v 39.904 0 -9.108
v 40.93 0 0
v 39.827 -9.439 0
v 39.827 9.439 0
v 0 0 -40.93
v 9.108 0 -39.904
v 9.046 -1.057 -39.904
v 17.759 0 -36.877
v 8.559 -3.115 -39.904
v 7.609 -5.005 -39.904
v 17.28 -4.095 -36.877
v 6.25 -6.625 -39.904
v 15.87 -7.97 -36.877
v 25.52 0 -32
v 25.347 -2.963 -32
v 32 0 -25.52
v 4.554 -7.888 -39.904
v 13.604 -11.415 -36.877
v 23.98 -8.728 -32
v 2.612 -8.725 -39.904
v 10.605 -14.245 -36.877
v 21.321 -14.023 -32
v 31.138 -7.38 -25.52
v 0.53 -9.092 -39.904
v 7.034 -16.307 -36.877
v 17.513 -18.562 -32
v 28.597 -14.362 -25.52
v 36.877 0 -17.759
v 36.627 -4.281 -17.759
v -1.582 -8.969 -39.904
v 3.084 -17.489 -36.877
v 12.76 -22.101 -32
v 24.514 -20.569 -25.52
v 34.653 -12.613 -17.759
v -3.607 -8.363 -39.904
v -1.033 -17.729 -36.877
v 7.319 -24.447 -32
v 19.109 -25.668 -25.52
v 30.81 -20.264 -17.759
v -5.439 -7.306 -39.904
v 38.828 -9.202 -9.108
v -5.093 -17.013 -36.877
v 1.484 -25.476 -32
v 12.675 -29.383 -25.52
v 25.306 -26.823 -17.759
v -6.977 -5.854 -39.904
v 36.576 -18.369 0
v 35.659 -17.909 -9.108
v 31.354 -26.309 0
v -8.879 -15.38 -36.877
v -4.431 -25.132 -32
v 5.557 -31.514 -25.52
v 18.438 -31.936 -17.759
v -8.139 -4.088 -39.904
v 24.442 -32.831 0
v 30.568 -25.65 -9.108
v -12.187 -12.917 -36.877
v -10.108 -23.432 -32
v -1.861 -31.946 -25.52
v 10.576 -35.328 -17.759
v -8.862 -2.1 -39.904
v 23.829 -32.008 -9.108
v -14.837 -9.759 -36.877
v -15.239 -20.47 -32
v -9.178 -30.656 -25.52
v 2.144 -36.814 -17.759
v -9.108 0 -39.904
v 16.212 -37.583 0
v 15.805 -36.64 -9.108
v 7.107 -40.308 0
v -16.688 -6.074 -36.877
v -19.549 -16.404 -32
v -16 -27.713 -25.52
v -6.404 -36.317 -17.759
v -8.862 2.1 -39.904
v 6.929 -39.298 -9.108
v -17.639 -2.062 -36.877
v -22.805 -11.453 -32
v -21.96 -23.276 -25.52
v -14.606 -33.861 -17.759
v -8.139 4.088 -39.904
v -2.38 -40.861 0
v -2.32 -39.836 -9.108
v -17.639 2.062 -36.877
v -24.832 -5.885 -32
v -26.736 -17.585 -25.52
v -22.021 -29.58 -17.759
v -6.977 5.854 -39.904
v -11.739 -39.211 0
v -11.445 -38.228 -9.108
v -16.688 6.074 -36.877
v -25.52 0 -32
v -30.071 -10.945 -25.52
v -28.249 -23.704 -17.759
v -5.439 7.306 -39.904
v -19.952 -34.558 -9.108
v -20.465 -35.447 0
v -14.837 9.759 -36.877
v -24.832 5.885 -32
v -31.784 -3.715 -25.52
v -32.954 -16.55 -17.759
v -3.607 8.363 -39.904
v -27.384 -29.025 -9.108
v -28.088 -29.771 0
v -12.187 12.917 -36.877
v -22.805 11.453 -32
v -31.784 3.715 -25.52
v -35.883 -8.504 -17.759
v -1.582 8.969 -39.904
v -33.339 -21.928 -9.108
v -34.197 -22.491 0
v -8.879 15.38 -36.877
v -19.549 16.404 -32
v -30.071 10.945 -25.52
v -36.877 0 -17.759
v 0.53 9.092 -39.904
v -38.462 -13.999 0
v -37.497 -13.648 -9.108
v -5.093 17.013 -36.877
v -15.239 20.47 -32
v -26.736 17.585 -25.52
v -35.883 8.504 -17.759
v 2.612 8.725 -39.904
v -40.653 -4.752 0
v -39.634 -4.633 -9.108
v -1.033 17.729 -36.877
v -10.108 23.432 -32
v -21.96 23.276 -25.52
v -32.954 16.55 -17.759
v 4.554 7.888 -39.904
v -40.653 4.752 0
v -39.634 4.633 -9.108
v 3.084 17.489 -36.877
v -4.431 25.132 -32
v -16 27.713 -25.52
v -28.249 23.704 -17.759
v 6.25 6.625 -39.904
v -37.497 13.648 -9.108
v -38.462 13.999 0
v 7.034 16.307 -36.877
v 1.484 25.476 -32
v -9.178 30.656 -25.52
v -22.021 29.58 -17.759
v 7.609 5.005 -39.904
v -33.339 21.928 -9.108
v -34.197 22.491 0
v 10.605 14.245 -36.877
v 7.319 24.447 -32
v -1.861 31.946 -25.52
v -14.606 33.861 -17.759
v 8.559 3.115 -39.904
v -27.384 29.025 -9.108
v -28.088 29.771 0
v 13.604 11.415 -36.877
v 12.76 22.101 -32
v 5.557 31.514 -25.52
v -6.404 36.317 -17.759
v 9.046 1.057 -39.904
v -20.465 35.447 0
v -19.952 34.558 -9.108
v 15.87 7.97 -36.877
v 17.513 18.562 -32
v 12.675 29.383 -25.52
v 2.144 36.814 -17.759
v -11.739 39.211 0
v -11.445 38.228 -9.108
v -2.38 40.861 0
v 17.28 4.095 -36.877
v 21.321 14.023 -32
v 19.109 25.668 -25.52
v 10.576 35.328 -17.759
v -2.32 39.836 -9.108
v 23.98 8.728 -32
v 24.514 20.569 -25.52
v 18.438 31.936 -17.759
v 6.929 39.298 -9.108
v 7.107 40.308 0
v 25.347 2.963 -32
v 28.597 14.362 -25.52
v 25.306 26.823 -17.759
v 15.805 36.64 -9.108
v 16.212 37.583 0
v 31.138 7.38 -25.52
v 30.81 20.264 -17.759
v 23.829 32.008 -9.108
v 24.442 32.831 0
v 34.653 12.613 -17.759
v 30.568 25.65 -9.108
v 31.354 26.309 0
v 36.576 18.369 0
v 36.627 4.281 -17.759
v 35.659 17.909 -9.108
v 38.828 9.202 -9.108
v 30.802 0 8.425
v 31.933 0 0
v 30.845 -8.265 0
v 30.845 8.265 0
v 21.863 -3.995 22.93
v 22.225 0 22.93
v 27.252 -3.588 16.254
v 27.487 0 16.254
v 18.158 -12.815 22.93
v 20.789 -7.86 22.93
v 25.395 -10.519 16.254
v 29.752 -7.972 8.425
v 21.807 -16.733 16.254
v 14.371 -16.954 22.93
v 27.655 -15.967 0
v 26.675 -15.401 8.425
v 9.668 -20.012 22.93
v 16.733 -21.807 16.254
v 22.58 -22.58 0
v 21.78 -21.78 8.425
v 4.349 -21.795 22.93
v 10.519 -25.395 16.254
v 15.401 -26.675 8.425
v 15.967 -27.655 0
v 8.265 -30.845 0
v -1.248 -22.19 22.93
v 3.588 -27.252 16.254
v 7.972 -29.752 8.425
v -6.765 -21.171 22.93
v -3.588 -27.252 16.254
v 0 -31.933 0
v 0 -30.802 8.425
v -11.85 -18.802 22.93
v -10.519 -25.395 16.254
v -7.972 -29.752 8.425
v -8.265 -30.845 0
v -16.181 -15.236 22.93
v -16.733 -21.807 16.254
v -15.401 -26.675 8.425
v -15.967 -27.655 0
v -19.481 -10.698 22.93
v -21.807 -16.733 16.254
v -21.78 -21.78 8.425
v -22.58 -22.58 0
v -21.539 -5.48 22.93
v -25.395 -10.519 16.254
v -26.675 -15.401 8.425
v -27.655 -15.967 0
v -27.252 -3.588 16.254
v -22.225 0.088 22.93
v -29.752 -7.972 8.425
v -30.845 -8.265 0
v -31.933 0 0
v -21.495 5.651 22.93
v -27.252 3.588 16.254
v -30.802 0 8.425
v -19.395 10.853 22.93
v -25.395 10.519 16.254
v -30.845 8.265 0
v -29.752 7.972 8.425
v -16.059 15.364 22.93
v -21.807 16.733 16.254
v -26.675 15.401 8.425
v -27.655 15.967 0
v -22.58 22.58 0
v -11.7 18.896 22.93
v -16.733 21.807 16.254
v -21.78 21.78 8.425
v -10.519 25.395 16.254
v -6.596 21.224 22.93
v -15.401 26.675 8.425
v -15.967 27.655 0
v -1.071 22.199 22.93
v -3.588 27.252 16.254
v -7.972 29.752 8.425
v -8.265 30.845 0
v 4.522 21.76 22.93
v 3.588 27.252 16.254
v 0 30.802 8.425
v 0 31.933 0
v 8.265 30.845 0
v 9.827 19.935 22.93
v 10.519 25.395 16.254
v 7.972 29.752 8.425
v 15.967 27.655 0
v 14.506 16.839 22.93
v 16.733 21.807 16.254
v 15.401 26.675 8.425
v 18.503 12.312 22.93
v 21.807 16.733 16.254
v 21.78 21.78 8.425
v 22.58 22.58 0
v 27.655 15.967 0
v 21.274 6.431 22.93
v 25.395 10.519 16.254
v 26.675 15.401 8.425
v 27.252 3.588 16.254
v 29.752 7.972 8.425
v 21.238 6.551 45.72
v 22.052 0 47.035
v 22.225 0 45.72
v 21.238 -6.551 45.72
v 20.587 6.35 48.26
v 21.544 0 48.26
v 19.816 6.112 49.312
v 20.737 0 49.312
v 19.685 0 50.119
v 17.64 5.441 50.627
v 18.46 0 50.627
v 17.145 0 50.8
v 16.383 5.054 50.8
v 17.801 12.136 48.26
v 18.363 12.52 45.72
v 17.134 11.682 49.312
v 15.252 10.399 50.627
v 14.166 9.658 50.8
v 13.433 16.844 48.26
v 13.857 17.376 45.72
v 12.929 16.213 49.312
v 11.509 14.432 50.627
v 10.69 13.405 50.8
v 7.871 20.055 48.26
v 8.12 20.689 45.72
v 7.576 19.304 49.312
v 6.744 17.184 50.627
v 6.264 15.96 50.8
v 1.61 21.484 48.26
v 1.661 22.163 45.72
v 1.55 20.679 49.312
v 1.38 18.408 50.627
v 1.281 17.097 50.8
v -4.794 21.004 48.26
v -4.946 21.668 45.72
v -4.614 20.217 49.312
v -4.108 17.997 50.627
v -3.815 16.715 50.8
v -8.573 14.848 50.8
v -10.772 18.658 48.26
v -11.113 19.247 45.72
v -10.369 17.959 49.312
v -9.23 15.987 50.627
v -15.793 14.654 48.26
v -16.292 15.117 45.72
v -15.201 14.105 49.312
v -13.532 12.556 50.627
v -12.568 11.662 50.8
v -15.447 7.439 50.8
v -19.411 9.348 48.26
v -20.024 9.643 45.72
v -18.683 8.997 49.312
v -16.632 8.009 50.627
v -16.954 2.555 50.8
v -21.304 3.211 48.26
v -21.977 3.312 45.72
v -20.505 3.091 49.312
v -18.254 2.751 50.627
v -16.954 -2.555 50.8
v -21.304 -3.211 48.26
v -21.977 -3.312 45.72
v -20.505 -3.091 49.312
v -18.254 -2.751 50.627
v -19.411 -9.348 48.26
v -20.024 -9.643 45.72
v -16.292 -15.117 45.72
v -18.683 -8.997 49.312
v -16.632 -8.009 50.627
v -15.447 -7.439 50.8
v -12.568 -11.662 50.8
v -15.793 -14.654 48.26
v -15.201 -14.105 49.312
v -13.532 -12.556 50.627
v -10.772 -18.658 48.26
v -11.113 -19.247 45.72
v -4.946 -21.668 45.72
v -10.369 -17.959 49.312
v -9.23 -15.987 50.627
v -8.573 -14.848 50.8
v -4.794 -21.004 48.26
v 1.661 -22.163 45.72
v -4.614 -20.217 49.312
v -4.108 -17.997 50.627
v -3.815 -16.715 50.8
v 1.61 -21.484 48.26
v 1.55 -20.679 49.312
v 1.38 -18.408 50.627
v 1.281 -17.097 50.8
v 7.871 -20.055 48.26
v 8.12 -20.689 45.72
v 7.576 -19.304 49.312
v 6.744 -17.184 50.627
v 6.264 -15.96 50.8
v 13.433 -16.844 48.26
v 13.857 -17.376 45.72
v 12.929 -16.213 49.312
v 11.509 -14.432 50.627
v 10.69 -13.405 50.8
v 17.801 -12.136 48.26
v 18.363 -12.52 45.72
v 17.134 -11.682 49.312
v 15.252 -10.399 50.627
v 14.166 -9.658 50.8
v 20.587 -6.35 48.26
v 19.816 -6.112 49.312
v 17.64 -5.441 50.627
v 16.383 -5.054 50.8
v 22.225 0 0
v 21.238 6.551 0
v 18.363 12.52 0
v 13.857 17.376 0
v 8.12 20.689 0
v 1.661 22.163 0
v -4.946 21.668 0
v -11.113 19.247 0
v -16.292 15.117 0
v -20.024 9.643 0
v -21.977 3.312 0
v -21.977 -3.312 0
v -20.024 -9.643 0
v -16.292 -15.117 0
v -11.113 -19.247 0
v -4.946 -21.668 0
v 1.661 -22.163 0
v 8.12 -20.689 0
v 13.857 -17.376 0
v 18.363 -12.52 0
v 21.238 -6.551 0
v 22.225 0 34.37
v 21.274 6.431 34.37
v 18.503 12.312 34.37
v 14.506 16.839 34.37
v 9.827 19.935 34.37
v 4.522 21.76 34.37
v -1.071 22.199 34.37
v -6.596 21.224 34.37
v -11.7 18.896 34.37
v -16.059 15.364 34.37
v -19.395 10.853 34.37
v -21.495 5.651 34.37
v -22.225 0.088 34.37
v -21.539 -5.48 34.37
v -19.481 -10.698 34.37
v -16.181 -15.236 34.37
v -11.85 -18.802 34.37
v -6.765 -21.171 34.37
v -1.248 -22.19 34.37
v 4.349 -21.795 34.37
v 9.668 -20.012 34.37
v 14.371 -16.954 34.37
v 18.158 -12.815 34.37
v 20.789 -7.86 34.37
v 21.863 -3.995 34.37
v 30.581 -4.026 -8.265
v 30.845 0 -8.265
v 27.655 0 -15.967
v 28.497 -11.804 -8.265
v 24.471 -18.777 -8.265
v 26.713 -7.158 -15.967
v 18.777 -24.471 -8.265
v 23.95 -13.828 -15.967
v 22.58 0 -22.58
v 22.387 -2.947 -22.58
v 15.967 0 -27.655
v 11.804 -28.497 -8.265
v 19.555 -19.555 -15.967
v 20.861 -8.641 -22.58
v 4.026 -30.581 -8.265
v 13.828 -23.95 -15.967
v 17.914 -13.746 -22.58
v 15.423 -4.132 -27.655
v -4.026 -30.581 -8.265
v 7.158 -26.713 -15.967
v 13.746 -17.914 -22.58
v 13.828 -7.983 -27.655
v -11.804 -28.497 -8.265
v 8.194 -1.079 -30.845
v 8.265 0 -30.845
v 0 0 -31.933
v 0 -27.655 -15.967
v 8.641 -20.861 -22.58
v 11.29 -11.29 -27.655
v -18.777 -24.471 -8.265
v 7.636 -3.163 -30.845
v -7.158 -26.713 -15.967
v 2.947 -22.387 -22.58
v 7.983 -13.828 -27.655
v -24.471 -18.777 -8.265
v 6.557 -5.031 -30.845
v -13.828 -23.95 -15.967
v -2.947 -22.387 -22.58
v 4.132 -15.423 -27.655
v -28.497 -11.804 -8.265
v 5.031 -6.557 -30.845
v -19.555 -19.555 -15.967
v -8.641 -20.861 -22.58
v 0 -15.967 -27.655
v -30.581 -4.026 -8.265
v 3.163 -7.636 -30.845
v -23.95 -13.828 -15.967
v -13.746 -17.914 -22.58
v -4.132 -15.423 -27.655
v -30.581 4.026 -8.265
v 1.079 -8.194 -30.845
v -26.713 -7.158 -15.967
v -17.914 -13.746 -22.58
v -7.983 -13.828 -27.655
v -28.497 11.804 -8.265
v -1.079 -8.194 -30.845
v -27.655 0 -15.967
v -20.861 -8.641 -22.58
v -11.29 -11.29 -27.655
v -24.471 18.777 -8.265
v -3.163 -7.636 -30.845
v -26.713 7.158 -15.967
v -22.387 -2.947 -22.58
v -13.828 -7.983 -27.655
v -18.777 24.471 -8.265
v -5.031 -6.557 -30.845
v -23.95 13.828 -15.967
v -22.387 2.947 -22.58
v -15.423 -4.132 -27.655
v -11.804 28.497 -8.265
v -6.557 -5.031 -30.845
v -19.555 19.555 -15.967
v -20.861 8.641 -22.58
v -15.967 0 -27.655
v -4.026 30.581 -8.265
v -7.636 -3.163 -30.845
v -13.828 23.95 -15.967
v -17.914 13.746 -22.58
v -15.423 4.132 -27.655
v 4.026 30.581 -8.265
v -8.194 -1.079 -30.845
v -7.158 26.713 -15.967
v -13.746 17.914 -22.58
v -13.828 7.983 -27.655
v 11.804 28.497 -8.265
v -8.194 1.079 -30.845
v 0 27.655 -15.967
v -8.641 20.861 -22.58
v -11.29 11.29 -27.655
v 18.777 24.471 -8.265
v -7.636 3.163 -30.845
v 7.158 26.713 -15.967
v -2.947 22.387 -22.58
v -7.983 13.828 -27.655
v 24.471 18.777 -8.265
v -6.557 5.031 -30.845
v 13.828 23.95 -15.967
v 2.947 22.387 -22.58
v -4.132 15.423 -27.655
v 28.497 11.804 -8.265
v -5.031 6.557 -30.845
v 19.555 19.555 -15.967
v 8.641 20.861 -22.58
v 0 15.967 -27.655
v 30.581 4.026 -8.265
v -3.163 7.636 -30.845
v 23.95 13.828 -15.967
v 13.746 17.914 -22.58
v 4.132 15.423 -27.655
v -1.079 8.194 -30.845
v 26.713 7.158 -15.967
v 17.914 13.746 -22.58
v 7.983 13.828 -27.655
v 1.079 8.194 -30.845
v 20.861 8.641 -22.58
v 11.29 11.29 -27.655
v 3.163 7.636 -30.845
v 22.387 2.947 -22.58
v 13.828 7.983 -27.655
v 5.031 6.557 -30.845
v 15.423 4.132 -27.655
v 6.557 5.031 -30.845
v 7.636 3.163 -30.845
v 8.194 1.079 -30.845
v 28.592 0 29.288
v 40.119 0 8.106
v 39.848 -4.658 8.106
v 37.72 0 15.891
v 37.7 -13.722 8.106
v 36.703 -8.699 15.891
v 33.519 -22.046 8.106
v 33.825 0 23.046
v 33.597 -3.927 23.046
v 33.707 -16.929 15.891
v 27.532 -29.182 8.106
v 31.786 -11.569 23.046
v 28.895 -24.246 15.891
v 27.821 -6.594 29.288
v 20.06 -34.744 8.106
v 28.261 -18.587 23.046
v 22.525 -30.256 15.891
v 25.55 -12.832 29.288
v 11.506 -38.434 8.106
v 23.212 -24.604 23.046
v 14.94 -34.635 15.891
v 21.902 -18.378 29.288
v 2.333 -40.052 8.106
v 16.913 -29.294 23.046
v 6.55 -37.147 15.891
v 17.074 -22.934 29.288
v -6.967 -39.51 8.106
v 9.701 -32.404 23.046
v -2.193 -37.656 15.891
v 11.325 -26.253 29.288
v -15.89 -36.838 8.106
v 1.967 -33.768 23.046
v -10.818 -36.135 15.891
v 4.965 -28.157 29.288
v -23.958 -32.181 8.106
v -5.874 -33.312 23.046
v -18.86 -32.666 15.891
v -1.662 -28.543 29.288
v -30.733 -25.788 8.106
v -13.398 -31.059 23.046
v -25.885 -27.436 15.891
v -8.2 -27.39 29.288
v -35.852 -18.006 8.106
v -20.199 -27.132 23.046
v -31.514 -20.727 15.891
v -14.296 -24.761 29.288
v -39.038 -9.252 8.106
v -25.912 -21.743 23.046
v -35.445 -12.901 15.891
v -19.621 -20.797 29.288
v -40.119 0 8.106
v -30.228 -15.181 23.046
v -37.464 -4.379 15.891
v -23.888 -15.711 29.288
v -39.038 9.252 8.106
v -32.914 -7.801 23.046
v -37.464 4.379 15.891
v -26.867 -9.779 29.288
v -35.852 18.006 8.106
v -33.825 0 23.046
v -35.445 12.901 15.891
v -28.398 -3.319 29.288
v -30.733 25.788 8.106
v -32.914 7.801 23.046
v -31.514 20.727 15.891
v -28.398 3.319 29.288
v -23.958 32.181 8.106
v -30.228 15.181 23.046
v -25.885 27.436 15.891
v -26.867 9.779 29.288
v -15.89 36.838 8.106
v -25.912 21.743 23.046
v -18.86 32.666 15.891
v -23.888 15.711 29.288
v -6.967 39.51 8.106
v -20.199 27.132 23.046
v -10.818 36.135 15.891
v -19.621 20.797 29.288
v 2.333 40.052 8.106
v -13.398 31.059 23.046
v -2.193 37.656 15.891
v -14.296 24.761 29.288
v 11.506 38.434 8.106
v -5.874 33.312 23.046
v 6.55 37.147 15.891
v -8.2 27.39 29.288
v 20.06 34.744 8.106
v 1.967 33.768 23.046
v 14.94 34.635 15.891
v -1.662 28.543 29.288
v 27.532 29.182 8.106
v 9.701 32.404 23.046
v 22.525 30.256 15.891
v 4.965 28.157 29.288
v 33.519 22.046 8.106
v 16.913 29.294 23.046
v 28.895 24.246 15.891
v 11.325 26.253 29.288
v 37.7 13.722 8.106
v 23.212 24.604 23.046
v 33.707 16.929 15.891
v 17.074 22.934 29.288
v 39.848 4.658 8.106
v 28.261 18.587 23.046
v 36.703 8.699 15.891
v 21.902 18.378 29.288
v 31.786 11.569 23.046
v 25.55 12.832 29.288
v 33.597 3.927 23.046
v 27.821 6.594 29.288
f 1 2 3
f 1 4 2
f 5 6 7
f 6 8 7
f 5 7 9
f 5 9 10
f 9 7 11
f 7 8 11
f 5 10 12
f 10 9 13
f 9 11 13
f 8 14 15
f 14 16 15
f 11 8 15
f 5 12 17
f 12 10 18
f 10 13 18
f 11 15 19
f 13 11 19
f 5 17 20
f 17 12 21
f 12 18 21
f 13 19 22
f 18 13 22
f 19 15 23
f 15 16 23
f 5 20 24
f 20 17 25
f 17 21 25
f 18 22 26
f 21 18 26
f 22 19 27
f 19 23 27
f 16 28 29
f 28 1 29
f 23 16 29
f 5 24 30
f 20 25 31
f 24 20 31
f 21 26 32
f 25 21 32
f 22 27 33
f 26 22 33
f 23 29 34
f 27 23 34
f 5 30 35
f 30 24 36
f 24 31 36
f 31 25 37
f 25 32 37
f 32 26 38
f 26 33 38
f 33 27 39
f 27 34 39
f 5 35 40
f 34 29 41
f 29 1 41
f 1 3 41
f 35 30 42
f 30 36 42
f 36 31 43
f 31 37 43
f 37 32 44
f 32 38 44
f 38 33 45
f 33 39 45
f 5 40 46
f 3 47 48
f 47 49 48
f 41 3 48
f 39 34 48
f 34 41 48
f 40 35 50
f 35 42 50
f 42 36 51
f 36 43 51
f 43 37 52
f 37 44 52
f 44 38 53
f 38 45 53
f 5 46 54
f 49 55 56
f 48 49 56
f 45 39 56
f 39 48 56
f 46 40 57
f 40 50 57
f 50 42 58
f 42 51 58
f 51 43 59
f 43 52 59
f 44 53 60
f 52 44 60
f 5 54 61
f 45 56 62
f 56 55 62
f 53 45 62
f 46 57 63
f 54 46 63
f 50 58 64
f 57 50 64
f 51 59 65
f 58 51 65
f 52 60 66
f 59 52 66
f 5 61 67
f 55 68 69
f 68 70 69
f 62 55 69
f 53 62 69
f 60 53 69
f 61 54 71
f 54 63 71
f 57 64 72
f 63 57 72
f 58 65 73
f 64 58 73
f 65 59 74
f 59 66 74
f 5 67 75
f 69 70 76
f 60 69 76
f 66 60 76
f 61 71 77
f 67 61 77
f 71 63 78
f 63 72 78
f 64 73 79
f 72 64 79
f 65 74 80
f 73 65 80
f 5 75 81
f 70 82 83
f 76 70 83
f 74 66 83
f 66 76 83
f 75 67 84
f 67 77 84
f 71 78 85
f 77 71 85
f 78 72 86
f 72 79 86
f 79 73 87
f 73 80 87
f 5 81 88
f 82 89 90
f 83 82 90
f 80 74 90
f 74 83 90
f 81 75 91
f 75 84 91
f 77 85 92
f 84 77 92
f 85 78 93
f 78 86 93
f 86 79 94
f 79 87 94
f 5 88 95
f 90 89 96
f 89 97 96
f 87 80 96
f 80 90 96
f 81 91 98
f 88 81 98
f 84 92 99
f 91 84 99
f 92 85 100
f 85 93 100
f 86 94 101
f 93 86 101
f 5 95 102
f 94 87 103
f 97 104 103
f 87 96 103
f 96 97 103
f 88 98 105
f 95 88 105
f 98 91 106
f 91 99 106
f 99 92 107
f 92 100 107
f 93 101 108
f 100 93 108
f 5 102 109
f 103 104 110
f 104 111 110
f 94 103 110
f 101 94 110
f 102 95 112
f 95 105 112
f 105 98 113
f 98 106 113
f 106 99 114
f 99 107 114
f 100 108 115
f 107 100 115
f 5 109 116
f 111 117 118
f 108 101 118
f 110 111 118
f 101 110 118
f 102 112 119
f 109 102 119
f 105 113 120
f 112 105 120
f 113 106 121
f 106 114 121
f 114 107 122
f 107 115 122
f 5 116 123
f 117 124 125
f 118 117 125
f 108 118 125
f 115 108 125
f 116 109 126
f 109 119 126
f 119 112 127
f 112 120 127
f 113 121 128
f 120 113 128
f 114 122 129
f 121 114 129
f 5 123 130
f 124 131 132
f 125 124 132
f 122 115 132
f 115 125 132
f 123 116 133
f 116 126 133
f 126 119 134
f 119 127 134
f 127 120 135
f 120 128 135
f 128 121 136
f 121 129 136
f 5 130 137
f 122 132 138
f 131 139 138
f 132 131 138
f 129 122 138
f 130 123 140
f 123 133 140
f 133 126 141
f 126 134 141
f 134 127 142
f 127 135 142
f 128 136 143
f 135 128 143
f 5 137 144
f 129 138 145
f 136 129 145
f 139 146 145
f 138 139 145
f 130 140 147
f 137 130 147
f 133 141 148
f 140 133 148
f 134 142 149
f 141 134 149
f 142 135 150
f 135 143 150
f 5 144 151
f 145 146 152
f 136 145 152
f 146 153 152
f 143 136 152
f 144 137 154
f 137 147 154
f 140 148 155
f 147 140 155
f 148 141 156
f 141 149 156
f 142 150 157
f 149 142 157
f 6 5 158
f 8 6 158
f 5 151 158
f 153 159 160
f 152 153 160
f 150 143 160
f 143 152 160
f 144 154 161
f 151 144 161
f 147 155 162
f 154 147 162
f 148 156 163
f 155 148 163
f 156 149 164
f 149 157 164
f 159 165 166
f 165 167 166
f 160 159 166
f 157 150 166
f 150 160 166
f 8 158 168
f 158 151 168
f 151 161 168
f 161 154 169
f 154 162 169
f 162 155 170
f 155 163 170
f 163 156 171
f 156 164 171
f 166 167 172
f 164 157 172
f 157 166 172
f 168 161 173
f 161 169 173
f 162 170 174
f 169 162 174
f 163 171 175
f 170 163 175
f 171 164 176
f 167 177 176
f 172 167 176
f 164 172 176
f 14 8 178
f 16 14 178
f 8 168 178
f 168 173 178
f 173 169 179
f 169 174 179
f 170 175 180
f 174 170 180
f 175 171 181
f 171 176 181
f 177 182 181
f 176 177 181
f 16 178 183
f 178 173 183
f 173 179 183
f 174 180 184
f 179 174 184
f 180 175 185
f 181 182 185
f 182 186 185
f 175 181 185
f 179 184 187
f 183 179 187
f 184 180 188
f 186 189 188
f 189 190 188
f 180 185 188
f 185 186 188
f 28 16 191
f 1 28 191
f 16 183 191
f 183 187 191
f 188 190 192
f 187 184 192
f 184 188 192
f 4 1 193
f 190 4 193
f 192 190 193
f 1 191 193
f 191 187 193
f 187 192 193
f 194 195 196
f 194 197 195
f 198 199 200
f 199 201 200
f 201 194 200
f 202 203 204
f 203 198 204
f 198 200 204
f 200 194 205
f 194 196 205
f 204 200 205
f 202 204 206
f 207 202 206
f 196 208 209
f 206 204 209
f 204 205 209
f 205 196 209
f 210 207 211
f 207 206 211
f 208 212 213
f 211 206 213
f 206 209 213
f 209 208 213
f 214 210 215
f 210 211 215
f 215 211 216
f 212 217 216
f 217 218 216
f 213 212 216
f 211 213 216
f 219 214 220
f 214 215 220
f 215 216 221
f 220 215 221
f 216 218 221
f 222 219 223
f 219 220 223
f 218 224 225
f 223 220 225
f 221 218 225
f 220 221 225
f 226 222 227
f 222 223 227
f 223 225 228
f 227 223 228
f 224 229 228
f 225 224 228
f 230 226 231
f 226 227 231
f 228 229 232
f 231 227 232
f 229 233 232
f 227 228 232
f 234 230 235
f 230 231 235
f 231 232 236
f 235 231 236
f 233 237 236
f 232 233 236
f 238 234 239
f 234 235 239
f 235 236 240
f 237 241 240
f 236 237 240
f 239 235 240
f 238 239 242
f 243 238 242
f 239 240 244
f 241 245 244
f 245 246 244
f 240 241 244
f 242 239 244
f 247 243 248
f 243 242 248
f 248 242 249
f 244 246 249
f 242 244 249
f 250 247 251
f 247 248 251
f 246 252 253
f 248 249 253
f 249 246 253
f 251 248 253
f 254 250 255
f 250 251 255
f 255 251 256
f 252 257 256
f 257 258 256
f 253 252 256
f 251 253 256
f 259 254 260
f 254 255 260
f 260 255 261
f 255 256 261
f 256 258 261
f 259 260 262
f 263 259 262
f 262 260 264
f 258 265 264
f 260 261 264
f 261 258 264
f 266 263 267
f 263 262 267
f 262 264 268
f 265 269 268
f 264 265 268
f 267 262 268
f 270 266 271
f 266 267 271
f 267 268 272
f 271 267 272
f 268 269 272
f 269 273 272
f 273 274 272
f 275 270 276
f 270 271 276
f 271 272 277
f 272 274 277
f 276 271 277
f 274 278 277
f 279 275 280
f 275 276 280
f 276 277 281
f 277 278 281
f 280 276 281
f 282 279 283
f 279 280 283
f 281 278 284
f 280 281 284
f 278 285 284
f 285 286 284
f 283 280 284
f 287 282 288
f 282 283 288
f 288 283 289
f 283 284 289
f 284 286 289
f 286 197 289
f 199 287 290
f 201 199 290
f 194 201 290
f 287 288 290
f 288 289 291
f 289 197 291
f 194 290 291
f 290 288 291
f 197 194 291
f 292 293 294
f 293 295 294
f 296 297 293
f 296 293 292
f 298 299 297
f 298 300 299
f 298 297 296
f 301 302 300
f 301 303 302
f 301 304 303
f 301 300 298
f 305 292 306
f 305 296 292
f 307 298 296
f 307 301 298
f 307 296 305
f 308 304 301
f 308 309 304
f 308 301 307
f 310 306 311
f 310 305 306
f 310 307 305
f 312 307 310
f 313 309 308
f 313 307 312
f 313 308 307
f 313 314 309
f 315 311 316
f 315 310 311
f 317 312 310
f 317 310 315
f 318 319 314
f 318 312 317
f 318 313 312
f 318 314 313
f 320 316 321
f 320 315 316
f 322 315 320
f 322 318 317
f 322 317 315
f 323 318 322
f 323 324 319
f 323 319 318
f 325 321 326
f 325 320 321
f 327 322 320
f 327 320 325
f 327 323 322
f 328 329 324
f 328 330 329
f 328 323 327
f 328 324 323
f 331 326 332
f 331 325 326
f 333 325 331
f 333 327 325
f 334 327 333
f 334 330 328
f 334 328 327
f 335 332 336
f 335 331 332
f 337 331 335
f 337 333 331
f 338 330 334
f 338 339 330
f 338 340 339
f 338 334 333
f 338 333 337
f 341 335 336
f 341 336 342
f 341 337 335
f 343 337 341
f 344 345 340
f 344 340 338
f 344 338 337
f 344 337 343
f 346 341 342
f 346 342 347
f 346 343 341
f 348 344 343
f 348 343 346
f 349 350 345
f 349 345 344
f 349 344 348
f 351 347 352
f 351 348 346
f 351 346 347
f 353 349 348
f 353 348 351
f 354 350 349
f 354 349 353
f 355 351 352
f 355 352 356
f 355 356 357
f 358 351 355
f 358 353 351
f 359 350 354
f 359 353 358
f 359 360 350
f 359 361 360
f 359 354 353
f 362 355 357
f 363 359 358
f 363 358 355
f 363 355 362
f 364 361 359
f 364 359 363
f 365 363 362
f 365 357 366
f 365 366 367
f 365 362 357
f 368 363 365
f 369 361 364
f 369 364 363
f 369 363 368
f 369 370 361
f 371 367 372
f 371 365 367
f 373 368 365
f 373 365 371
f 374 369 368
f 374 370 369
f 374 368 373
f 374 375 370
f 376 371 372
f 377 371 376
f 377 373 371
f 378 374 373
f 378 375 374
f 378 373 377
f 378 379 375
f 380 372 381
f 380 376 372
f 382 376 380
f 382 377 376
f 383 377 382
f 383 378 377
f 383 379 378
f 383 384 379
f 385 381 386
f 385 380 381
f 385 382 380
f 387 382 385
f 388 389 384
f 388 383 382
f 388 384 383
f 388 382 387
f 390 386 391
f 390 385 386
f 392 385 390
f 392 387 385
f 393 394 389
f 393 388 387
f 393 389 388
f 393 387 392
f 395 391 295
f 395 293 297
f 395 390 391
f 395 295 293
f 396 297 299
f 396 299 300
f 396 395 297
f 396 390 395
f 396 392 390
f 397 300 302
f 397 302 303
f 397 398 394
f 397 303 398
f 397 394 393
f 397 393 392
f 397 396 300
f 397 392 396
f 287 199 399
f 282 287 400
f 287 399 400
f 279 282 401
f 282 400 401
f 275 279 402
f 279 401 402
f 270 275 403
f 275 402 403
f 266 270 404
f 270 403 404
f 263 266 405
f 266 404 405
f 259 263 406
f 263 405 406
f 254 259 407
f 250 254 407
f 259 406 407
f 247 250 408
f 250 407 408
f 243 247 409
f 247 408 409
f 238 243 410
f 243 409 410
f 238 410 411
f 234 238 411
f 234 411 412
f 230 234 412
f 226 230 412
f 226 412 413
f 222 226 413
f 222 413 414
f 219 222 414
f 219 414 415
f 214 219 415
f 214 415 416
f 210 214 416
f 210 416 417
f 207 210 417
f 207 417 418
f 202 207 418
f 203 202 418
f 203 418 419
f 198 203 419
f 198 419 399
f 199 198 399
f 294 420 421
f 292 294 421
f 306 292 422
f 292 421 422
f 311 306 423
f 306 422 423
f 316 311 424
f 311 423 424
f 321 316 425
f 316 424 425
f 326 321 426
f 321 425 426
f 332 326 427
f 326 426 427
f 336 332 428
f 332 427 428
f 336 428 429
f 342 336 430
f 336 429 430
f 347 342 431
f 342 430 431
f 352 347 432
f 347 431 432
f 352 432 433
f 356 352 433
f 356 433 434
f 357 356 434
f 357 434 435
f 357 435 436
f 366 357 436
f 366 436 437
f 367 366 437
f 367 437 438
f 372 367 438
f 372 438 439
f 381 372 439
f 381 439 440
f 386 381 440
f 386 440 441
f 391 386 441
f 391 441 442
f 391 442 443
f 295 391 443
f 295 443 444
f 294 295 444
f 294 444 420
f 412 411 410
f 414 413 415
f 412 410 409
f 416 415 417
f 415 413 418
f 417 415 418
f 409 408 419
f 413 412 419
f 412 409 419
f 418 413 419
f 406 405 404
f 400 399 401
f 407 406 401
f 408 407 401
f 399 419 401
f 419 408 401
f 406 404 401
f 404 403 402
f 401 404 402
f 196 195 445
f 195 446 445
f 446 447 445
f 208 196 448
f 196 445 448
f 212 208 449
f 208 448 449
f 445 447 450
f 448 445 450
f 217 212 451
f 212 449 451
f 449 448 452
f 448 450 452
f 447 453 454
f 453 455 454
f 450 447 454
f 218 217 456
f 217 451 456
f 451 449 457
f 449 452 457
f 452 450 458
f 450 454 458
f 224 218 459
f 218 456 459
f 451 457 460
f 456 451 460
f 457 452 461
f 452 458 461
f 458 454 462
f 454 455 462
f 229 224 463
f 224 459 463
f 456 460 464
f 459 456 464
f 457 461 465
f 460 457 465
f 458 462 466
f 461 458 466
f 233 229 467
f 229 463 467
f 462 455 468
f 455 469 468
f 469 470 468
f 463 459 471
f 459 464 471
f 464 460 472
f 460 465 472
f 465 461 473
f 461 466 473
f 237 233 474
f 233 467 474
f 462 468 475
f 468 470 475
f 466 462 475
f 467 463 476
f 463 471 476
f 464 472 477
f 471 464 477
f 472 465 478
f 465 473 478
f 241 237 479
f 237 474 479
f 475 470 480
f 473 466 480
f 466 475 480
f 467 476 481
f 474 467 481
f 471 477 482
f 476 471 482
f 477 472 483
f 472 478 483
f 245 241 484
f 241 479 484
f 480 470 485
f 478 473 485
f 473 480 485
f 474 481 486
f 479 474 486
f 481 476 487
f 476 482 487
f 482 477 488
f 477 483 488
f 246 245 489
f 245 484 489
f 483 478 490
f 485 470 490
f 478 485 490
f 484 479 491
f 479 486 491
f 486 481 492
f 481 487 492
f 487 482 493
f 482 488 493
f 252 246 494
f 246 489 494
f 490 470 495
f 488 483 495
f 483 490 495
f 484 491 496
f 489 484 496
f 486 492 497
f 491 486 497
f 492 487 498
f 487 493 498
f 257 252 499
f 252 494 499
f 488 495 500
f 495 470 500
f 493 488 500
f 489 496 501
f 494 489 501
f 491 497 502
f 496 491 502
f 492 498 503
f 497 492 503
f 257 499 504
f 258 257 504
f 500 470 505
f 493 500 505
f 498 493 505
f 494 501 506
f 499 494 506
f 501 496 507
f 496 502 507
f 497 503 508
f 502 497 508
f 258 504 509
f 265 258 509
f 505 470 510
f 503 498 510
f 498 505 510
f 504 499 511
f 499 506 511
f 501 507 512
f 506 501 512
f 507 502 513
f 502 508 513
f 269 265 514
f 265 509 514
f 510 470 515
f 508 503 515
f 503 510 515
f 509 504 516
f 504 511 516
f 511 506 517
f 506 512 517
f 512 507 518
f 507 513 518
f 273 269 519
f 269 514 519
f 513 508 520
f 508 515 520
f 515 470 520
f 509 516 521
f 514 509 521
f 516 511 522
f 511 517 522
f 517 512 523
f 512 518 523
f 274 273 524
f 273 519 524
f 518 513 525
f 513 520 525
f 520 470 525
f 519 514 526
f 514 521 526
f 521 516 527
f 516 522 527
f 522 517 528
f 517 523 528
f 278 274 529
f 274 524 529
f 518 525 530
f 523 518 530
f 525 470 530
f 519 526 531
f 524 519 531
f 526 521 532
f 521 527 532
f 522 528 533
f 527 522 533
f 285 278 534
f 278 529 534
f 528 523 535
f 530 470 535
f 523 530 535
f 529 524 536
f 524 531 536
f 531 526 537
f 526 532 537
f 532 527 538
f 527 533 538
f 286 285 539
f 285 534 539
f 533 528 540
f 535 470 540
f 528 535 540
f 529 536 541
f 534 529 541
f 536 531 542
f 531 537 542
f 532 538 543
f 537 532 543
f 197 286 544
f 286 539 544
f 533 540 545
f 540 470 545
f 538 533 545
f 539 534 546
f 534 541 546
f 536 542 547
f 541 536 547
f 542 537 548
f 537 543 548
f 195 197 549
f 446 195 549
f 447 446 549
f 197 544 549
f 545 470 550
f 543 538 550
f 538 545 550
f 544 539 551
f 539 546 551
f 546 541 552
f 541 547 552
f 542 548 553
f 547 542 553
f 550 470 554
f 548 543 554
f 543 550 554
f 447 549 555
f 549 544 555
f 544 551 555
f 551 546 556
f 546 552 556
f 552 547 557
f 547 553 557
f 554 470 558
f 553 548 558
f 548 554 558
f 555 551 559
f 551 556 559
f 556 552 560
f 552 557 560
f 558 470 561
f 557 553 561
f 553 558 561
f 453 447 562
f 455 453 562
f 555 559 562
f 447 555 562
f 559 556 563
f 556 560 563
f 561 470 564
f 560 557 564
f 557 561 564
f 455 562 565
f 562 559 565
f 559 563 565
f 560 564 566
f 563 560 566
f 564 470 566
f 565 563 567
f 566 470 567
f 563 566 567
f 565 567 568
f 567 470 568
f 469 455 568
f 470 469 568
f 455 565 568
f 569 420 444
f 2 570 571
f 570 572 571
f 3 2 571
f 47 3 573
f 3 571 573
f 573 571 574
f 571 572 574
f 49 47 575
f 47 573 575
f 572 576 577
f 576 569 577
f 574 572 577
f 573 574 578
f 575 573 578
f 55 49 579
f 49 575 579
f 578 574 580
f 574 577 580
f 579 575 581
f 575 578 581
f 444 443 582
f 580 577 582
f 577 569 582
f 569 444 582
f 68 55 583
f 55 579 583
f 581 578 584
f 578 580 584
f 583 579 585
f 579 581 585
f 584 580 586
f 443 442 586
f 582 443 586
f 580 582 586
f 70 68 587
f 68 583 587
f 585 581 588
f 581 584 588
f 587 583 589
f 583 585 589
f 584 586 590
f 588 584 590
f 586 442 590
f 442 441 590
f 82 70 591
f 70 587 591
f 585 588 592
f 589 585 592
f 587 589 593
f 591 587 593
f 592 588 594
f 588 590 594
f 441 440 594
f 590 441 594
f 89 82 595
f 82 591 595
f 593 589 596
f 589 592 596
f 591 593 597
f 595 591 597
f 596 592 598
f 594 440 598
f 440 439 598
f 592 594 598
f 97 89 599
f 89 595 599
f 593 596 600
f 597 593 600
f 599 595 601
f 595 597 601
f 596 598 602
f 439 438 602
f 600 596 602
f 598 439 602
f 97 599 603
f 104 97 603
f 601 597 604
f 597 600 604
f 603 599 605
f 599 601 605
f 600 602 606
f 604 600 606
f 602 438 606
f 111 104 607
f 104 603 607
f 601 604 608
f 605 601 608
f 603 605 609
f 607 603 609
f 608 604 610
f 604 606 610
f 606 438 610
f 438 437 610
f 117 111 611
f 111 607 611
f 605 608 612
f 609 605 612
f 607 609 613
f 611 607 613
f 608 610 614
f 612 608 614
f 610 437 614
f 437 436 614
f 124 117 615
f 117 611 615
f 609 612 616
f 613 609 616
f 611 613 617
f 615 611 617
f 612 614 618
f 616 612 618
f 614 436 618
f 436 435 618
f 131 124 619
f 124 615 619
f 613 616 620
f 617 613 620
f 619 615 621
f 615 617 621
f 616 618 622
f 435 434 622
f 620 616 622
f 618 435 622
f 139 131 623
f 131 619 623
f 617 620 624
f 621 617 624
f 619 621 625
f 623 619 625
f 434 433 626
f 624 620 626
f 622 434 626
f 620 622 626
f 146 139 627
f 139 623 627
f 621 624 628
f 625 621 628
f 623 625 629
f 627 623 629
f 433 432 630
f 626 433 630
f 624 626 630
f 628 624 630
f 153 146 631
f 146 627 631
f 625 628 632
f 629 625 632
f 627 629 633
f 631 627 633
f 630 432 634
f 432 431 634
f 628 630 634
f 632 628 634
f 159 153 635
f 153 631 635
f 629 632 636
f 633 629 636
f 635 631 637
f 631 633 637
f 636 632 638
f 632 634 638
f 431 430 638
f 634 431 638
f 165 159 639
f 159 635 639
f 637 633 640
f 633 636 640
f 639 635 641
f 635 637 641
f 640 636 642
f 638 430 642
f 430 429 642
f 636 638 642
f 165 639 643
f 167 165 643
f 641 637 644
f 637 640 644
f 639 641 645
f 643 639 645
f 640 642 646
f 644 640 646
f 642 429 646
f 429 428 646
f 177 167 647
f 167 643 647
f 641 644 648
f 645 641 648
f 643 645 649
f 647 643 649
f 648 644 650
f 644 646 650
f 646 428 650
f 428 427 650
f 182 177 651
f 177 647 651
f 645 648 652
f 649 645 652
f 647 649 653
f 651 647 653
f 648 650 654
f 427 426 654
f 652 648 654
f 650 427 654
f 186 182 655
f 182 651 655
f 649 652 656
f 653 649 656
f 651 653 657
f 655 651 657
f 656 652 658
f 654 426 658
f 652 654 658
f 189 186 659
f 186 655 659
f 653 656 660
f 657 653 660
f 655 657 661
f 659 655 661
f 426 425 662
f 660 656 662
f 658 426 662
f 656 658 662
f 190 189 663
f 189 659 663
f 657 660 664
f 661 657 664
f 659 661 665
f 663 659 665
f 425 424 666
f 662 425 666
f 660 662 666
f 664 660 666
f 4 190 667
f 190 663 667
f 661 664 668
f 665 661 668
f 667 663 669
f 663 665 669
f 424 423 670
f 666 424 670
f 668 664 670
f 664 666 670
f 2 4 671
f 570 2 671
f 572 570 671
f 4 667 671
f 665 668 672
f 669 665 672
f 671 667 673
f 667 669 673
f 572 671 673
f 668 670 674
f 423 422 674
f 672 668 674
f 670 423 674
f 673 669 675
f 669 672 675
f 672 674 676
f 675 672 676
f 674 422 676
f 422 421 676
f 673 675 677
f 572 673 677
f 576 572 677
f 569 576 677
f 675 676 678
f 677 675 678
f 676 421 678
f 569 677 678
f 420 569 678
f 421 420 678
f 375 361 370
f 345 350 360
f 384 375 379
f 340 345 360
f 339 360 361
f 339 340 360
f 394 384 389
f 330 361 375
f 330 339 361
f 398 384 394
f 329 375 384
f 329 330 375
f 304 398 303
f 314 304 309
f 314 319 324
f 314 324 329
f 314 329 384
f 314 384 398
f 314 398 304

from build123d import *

# Parameters (mm, degrees)
F2_R     = 22.225
F3_DEPTH = 50.8
F4_R     = 5.08


with BuildPart() as f1:
    # F0 (on Front) → F1 (revolve)
    with BuildSketch(Plane.XZ):
        with BuildLine():
            Line((0, -31.9333635271), (0, -40.9301067458))
            ThreePointArc((0, -40.9301067458), (28.9419560347, -28.9419560347), (40.9301067458, 0))
            Line((40.9301067458, 0), (31.9333635271, 0))
            ThreePointArc((31.9333635271, 0), (22.5802978961, -22.5802978961), (0, -31.9333635271))
        make_face()
        with BuildLine():
            Line((31.9333635271, 0), (40.9301067458, 0))
            ThreePointArc((40.9301067458, 0), (28.9419560347, 28.9419560347), (0, 40.9301067458))
            Line((0, 40.9301067458), (0, 31.9333635271))
            ThreePointArc((0, 31.9333635271), (22.5802978961, 22.5802978961), (31.9333635271, 0))
        make_face()
    revolve(axis=Axis((0, 0, 0), (0, 0, -1)))

    # F2 (on Top) → F3 (join)
    with BuildSketch(Plane.XY):
        Circle(F2_R)
    extrude(amount=F3_DEPTH)

    # F4
    f4_edges = [f1.edges().sort_by_distance(p)[0] for p in [
        (-22.225, 0, 50.8),
    ]]
    fillet(f4_edges, radius=F4_R)


solid = f1.part
